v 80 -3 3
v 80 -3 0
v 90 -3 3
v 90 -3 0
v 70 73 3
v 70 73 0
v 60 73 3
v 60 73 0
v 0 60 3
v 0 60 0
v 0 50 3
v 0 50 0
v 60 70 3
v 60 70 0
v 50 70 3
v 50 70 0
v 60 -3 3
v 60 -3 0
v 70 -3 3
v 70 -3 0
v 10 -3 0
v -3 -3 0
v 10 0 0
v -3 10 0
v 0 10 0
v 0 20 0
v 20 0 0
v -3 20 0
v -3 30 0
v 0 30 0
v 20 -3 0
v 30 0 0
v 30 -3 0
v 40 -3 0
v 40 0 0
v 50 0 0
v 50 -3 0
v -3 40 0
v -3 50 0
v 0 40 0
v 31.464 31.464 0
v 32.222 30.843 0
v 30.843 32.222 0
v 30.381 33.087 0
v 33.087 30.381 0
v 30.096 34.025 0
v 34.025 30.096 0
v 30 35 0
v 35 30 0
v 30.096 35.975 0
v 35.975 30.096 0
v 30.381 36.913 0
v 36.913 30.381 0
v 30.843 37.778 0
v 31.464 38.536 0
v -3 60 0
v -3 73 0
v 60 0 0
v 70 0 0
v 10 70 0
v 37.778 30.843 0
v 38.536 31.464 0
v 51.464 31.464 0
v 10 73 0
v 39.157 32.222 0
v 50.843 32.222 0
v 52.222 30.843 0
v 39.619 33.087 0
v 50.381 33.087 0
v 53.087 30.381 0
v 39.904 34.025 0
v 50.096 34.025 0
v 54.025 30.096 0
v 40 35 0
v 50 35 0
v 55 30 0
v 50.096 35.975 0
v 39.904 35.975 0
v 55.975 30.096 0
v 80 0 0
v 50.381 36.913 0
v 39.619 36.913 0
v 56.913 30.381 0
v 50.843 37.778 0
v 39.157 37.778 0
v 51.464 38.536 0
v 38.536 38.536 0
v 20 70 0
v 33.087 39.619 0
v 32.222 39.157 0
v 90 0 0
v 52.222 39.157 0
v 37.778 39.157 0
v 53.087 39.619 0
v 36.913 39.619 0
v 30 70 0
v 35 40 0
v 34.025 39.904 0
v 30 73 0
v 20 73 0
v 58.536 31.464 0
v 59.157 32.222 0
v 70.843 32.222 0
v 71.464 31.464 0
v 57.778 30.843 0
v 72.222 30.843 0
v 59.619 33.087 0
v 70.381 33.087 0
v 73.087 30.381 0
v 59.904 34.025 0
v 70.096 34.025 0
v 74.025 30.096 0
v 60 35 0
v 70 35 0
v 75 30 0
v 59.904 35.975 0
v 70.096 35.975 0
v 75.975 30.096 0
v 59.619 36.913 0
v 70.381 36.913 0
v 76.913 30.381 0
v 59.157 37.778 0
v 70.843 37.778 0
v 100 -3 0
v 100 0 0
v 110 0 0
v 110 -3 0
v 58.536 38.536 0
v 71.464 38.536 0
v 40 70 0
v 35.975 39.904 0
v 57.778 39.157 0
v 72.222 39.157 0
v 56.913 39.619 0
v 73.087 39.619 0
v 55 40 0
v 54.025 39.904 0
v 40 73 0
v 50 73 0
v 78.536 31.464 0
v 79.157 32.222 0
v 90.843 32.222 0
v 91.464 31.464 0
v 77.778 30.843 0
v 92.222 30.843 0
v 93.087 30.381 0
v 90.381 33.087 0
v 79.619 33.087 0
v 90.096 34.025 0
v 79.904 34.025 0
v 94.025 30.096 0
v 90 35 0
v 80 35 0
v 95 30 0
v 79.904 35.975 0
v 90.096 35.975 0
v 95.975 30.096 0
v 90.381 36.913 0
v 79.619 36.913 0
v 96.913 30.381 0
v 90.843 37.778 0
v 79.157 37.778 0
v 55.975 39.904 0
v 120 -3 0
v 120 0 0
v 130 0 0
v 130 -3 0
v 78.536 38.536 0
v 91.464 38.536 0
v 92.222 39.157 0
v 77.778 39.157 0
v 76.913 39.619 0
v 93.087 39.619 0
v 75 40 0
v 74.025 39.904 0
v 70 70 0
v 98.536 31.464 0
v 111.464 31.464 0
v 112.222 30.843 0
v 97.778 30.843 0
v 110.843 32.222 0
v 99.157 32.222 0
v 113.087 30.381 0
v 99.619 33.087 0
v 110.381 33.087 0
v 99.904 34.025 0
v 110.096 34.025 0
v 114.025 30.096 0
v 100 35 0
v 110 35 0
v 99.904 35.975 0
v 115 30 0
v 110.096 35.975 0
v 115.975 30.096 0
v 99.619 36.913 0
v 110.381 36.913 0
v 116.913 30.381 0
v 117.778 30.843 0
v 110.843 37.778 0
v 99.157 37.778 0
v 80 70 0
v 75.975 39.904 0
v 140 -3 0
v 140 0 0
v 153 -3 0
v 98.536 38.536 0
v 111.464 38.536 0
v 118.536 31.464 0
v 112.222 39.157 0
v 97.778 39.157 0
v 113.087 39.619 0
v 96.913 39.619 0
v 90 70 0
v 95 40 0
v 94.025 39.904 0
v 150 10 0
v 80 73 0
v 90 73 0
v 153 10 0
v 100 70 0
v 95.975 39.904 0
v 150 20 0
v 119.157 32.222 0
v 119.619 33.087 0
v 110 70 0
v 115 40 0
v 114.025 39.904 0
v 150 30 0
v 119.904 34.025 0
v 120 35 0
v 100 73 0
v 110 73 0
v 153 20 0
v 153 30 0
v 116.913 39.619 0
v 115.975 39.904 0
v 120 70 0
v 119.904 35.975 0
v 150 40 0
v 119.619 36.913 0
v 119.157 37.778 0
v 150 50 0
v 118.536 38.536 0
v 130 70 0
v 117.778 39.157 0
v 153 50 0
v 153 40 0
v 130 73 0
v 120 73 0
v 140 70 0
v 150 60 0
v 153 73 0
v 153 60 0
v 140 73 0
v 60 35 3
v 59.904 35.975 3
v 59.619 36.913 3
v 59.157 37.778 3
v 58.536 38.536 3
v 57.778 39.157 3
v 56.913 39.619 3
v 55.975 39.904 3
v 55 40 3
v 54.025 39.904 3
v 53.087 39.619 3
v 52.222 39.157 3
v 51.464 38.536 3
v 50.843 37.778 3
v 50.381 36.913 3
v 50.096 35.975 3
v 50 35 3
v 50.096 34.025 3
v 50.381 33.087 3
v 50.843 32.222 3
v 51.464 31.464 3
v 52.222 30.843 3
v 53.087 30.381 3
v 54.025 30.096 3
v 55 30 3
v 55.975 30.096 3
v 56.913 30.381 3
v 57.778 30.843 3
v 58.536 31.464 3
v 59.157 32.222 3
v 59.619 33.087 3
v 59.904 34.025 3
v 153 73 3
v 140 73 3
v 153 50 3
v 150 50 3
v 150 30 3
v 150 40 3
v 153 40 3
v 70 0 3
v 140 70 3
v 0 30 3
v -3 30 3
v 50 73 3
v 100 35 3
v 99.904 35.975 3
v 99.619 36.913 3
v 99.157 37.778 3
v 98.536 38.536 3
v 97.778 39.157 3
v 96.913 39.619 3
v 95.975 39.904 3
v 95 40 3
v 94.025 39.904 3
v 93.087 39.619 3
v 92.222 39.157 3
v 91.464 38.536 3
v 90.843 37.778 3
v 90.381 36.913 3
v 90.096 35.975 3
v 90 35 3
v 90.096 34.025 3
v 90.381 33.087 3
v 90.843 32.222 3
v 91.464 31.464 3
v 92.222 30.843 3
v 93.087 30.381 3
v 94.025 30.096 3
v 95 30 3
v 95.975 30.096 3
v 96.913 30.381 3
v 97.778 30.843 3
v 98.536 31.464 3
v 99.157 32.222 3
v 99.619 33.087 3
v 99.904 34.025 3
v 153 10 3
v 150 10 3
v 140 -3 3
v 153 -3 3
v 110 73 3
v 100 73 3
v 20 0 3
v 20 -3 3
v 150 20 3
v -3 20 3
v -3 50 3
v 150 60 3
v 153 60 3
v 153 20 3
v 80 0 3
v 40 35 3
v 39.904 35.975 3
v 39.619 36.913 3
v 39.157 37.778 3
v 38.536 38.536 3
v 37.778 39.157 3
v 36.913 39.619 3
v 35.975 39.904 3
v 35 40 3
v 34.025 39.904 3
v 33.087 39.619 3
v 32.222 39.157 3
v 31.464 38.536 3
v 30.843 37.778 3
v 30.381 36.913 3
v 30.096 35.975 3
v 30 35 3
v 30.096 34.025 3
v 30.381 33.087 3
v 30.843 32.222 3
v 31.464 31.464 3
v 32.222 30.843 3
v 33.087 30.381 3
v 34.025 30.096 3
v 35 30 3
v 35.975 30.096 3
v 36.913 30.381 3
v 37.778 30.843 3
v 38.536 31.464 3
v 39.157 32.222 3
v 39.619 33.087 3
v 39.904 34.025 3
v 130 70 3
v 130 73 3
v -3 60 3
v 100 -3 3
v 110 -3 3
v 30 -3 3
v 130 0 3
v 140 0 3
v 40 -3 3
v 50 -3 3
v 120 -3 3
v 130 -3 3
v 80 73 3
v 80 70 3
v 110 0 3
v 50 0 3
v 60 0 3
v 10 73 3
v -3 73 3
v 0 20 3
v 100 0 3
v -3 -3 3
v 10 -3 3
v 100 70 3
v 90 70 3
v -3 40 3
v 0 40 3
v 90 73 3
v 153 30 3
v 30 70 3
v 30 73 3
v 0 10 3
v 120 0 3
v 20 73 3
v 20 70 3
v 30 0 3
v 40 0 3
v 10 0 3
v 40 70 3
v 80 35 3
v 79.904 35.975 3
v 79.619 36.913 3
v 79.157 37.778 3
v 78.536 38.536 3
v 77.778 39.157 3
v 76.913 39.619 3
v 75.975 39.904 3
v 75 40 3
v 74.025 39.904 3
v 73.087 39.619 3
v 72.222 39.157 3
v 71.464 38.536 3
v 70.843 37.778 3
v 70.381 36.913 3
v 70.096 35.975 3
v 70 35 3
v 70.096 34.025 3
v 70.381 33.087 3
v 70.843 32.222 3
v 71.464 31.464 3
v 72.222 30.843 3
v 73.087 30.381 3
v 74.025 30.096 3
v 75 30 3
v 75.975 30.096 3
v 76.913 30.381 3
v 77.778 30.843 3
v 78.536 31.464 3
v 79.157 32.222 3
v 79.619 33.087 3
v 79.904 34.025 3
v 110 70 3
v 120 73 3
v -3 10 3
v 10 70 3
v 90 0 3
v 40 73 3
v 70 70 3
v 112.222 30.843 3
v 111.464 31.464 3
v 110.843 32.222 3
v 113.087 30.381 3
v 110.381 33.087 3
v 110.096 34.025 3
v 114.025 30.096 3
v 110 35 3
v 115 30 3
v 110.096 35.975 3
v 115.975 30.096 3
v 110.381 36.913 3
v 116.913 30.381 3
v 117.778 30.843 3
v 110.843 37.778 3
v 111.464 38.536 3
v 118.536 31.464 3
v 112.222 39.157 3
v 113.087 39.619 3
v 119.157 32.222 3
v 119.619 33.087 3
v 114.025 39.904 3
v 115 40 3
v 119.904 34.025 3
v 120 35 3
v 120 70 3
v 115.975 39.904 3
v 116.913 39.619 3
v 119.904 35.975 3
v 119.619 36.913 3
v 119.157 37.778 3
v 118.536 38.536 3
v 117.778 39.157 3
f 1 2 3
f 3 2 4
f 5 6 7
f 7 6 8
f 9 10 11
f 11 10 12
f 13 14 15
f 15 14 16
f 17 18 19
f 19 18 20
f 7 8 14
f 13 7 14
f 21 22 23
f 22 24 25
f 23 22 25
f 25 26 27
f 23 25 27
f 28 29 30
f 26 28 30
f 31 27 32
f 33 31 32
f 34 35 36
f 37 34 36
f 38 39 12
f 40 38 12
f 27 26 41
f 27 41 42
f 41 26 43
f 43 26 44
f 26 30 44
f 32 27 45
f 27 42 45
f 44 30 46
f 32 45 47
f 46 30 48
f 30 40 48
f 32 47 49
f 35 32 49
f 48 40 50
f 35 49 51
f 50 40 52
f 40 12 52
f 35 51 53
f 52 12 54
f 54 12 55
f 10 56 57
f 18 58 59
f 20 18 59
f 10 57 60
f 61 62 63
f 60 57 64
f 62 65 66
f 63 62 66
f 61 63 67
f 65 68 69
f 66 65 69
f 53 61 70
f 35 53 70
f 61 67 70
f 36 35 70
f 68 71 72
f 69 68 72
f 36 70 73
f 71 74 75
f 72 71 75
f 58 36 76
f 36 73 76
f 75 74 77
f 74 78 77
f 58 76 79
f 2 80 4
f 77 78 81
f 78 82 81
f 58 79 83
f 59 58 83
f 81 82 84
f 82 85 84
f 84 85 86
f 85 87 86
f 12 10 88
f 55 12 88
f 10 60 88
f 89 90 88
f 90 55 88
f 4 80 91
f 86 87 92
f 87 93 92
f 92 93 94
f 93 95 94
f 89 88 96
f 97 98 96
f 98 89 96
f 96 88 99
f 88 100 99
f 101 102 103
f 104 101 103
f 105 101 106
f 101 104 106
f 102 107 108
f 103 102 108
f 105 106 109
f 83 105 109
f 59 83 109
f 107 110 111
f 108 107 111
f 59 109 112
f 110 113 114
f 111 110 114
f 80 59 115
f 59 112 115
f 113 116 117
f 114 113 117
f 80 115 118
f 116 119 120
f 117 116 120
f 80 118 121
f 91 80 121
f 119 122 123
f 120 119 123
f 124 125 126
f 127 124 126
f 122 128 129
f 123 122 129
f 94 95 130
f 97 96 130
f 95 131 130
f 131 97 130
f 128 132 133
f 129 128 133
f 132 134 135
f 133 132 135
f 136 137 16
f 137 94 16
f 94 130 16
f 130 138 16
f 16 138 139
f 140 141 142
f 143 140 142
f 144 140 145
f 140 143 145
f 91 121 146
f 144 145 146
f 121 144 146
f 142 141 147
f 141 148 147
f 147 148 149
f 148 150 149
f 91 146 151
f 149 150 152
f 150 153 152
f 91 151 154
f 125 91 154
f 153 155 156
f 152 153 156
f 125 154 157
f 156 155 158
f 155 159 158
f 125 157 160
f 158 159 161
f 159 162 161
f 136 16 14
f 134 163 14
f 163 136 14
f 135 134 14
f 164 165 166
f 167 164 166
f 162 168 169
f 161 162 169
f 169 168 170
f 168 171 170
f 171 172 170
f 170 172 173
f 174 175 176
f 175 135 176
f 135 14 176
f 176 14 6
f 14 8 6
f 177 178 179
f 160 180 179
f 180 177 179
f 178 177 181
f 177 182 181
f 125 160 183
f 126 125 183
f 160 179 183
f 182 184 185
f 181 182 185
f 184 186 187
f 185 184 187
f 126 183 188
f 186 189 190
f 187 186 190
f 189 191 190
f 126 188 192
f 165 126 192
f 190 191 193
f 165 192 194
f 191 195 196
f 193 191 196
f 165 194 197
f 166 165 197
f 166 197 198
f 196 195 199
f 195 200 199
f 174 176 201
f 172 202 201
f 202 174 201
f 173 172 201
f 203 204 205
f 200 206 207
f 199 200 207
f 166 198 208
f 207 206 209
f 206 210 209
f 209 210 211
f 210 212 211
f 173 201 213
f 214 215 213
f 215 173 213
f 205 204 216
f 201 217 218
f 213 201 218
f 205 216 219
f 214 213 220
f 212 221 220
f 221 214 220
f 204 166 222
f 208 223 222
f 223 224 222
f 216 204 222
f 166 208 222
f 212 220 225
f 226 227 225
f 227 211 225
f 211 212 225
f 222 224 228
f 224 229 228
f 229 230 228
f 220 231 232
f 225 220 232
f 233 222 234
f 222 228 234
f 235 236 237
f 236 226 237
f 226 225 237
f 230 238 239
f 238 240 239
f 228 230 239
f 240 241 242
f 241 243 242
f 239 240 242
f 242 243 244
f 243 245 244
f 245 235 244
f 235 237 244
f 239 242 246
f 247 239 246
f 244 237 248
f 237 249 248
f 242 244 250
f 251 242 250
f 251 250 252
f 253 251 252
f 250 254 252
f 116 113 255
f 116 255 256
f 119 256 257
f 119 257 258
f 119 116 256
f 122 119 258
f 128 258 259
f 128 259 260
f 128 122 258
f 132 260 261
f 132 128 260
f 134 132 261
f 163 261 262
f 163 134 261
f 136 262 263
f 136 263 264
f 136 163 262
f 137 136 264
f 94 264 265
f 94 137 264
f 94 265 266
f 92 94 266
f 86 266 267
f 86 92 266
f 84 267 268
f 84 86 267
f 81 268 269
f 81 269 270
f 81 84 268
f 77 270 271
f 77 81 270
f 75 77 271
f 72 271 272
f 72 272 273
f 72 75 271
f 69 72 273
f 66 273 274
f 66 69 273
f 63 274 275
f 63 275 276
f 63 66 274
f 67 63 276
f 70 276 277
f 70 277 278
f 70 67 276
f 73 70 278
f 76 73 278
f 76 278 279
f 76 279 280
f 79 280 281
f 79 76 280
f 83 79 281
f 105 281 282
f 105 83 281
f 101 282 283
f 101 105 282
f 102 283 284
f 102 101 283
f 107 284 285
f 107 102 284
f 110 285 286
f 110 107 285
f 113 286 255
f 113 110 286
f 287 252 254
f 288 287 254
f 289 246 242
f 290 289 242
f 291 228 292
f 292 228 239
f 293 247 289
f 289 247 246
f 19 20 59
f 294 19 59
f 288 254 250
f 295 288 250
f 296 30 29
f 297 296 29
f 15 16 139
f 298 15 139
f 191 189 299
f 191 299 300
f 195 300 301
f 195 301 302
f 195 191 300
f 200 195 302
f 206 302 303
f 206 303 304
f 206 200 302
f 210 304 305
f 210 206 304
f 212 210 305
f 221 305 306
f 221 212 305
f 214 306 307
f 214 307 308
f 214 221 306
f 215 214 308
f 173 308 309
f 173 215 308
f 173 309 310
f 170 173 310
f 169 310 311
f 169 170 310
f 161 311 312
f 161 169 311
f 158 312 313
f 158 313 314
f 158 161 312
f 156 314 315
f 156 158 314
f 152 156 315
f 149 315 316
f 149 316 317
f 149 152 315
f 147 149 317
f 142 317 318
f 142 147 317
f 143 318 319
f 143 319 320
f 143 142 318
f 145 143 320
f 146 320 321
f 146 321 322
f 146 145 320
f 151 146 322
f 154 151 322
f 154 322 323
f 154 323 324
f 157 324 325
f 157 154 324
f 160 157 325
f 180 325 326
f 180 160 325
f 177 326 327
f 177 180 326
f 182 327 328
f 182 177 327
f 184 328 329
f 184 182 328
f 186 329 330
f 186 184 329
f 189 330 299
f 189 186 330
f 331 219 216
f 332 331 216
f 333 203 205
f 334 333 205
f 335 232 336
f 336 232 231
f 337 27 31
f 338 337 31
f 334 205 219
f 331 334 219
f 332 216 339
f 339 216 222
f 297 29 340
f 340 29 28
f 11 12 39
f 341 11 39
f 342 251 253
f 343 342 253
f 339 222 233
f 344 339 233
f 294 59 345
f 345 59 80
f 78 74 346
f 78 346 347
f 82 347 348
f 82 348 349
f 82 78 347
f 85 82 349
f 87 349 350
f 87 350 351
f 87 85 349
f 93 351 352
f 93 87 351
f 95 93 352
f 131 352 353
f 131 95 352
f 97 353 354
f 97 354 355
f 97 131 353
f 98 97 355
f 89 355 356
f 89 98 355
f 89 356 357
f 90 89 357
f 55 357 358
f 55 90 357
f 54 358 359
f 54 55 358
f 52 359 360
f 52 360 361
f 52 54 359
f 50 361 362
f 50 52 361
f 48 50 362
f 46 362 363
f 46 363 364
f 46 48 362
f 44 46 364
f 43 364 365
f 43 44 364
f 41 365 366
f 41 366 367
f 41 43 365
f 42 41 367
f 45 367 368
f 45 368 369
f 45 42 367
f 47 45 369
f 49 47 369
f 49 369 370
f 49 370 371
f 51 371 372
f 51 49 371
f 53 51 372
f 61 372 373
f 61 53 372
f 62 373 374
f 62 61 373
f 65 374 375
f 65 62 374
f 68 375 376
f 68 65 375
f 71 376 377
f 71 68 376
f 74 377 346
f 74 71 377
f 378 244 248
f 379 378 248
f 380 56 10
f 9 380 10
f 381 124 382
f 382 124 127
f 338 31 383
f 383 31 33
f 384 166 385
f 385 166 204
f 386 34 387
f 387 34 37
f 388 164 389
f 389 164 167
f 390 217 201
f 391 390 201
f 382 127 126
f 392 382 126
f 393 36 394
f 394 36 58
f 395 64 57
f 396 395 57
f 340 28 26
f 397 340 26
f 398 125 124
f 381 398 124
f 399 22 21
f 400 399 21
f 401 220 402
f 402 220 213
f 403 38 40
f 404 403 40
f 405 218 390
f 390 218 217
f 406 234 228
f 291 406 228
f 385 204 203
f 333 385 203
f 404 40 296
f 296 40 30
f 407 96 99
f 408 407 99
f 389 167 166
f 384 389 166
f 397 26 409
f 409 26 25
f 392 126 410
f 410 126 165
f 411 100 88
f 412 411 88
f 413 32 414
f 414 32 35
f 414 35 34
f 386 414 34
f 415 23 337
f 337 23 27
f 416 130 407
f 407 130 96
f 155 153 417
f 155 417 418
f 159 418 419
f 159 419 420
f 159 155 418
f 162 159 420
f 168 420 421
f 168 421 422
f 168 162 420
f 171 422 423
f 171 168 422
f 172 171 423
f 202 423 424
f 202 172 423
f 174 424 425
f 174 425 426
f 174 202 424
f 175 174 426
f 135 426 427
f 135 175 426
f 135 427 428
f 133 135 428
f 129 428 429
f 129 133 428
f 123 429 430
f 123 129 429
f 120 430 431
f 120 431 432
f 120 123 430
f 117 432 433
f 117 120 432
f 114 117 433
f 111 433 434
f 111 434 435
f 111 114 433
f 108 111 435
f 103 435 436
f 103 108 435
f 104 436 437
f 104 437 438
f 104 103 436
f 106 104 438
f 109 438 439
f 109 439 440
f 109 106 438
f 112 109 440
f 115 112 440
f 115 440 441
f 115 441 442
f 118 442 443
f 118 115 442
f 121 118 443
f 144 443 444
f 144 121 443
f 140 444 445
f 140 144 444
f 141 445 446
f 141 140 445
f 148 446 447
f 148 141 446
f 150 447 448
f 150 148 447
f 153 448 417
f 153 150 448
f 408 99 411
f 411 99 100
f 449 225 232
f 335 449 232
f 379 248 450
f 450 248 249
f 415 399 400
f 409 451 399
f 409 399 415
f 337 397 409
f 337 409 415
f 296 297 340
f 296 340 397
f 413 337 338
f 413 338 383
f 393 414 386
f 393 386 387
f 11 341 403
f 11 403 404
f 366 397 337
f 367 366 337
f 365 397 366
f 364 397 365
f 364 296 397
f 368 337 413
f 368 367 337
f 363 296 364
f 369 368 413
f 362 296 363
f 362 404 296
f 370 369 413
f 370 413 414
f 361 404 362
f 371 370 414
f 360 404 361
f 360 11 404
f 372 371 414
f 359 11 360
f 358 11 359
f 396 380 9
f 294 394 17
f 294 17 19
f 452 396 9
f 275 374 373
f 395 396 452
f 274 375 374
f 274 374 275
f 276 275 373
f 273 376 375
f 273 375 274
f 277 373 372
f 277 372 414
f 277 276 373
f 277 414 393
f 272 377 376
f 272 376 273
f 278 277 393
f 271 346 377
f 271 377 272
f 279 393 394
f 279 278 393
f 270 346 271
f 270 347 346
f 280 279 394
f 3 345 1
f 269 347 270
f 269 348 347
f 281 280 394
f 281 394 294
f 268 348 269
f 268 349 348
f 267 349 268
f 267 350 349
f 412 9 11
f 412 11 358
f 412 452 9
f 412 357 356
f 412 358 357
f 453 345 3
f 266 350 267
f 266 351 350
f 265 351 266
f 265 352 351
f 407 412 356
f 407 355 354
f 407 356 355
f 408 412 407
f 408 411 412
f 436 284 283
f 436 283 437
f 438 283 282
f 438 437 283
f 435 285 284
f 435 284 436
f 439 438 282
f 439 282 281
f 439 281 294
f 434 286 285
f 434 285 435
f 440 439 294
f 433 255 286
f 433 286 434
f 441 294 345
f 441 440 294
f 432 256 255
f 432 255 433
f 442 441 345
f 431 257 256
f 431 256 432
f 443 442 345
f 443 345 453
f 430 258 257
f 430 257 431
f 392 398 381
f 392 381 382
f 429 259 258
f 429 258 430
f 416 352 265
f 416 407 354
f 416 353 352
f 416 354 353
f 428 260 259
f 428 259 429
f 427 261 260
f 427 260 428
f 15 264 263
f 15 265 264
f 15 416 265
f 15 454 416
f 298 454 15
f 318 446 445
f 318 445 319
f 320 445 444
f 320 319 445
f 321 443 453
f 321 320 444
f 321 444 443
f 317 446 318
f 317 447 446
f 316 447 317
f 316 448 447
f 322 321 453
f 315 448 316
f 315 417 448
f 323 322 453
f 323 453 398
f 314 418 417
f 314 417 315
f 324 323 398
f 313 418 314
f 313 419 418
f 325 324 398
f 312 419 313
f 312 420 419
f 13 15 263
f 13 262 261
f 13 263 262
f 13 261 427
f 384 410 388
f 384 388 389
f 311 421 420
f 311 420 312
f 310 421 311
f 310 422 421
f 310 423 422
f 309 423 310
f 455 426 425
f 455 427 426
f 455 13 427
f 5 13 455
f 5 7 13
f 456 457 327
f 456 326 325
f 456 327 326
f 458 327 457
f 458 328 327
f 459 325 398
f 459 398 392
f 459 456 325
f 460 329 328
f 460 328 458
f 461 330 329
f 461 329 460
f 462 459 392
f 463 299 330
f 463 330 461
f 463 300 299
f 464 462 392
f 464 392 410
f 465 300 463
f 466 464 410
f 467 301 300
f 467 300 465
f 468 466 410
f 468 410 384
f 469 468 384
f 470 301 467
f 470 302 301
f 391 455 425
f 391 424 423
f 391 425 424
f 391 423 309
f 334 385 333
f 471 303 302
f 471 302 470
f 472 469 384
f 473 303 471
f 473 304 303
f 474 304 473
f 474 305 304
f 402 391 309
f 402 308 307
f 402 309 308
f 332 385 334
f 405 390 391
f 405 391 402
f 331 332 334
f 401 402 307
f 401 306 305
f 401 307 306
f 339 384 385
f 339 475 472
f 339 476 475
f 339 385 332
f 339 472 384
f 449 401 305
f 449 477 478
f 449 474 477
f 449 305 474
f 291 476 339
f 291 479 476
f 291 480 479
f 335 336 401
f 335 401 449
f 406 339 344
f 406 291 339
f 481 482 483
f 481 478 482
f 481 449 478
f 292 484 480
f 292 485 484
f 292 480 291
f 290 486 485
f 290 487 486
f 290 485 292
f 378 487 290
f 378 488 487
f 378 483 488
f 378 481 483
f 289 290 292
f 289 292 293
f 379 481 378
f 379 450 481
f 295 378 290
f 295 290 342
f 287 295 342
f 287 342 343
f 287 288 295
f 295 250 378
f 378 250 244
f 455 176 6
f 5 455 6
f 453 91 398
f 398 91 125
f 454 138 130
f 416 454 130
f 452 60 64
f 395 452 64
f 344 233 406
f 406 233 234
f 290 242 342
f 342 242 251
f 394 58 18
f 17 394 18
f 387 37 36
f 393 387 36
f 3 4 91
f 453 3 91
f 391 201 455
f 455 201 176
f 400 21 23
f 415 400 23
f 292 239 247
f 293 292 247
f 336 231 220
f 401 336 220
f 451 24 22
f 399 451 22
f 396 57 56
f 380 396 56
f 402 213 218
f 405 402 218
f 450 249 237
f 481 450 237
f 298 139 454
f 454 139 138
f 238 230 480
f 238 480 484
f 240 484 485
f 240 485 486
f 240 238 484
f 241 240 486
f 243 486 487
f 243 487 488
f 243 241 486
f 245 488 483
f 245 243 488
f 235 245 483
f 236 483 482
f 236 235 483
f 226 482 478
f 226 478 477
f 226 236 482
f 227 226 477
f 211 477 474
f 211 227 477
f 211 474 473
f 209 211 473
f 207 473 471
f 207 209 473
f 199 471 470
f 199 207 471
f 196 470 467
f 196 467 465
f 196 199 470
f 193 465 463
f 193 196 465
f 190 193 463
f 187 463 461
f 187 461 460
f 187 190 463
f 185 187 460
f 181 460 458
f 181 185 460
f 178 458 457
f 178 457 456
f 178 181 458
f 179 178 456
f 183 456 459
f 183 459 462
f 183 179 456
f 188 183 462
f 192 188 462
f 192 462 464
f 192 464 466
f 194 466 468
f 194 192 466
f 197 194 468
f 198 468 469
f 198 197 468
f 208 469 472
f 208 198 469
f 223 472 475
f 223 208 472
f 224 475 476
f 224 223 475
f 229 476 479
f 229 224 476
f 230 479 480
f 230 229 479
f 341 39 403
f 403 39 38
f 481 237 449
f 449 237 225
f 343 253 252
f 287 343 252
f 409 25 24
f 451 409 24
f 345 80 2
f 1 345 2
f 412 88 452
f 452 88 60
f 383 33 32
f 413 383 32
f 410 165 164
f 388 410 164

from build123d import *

# Parameters (mm, degrees)
SKETCH1_R           = 5
BOSS_EXTRUDE1_DEPTH = 3


with BuildPart() as part:
    # Sketch1 → Boss-Extrude1 (new body)
    with BuildSketch(Plane.XY):
        Polygon((0, 60), (0, 50), (-3, 50), (-3, 40), (0, 40), (0, 30), (-3, 30), (-3, 20), (0, 20), (0, 10), (-3, 10), (-3, 0), (-3, -3), (0, -3), (10, -3), (10, 0), (20, 0), (20, -3), (30, -3), (30, 0), (40, 0), (40, -3), (50, -3), (50, 0), (60, 0), (60, -3), (70, -3), (70, 0), (80, 0), (80, -3), (90, -3), (90, 0), (100, 0), (100, -3), (110, -3), (110, 0), (120, 0), (120, -3), (130, -3), (130, 0), (140, 0), (140, -3), (150, -3), (153, -3), (153, 0), (153, 10), (150, 10), (150, 20), (153, 20), (153, 30), (150, 30), (150, 40), (153, 40), (153, 50), (150, 50), (150, 60), (153, 60), (153, 70), (153, 73), (150, 73), (140, 73), (140, 70), (130, 70), (130, 73), (120, 73), (120, 70), (110, 70), (110, 73), (100, 73), (100, 70), (90, 70), (90, 73), (80, 73), (80, 70), (70, 70), (70, 73), (60, 73), (60, 70), (50, 70), (50, 73), (40, 73), (40, 70), (30, 70), (30, 73), (20, 73), (20, 70), (10, 70), (10, 73), (0, 73), (-3, 73), (-3, 70), (-3, 60), align=None)
        with Locations((35, 35)):
            Circle(SKETCH1_R, mode=Mode.SUBTRACT)
        with Locations((55, 35)):
            Circle(SKETCH1_R, mode=Mode.SUBTRACT)
        with Locations((75, 35)):
            Circle(SKETCH1_R, mode=Mode.SUBTRACT)
        with Locations((95, 35)):
            Circle(SKETCH1_R, mode=Mode.SUBTRACT)
        with Locations((115, 35)):
            Circle(SKETCH1_R, mode=Mode.SUBTRACT)
    extrude(amount=BOSS_EXTRUDE1_DEPTH)


solid = part.part
